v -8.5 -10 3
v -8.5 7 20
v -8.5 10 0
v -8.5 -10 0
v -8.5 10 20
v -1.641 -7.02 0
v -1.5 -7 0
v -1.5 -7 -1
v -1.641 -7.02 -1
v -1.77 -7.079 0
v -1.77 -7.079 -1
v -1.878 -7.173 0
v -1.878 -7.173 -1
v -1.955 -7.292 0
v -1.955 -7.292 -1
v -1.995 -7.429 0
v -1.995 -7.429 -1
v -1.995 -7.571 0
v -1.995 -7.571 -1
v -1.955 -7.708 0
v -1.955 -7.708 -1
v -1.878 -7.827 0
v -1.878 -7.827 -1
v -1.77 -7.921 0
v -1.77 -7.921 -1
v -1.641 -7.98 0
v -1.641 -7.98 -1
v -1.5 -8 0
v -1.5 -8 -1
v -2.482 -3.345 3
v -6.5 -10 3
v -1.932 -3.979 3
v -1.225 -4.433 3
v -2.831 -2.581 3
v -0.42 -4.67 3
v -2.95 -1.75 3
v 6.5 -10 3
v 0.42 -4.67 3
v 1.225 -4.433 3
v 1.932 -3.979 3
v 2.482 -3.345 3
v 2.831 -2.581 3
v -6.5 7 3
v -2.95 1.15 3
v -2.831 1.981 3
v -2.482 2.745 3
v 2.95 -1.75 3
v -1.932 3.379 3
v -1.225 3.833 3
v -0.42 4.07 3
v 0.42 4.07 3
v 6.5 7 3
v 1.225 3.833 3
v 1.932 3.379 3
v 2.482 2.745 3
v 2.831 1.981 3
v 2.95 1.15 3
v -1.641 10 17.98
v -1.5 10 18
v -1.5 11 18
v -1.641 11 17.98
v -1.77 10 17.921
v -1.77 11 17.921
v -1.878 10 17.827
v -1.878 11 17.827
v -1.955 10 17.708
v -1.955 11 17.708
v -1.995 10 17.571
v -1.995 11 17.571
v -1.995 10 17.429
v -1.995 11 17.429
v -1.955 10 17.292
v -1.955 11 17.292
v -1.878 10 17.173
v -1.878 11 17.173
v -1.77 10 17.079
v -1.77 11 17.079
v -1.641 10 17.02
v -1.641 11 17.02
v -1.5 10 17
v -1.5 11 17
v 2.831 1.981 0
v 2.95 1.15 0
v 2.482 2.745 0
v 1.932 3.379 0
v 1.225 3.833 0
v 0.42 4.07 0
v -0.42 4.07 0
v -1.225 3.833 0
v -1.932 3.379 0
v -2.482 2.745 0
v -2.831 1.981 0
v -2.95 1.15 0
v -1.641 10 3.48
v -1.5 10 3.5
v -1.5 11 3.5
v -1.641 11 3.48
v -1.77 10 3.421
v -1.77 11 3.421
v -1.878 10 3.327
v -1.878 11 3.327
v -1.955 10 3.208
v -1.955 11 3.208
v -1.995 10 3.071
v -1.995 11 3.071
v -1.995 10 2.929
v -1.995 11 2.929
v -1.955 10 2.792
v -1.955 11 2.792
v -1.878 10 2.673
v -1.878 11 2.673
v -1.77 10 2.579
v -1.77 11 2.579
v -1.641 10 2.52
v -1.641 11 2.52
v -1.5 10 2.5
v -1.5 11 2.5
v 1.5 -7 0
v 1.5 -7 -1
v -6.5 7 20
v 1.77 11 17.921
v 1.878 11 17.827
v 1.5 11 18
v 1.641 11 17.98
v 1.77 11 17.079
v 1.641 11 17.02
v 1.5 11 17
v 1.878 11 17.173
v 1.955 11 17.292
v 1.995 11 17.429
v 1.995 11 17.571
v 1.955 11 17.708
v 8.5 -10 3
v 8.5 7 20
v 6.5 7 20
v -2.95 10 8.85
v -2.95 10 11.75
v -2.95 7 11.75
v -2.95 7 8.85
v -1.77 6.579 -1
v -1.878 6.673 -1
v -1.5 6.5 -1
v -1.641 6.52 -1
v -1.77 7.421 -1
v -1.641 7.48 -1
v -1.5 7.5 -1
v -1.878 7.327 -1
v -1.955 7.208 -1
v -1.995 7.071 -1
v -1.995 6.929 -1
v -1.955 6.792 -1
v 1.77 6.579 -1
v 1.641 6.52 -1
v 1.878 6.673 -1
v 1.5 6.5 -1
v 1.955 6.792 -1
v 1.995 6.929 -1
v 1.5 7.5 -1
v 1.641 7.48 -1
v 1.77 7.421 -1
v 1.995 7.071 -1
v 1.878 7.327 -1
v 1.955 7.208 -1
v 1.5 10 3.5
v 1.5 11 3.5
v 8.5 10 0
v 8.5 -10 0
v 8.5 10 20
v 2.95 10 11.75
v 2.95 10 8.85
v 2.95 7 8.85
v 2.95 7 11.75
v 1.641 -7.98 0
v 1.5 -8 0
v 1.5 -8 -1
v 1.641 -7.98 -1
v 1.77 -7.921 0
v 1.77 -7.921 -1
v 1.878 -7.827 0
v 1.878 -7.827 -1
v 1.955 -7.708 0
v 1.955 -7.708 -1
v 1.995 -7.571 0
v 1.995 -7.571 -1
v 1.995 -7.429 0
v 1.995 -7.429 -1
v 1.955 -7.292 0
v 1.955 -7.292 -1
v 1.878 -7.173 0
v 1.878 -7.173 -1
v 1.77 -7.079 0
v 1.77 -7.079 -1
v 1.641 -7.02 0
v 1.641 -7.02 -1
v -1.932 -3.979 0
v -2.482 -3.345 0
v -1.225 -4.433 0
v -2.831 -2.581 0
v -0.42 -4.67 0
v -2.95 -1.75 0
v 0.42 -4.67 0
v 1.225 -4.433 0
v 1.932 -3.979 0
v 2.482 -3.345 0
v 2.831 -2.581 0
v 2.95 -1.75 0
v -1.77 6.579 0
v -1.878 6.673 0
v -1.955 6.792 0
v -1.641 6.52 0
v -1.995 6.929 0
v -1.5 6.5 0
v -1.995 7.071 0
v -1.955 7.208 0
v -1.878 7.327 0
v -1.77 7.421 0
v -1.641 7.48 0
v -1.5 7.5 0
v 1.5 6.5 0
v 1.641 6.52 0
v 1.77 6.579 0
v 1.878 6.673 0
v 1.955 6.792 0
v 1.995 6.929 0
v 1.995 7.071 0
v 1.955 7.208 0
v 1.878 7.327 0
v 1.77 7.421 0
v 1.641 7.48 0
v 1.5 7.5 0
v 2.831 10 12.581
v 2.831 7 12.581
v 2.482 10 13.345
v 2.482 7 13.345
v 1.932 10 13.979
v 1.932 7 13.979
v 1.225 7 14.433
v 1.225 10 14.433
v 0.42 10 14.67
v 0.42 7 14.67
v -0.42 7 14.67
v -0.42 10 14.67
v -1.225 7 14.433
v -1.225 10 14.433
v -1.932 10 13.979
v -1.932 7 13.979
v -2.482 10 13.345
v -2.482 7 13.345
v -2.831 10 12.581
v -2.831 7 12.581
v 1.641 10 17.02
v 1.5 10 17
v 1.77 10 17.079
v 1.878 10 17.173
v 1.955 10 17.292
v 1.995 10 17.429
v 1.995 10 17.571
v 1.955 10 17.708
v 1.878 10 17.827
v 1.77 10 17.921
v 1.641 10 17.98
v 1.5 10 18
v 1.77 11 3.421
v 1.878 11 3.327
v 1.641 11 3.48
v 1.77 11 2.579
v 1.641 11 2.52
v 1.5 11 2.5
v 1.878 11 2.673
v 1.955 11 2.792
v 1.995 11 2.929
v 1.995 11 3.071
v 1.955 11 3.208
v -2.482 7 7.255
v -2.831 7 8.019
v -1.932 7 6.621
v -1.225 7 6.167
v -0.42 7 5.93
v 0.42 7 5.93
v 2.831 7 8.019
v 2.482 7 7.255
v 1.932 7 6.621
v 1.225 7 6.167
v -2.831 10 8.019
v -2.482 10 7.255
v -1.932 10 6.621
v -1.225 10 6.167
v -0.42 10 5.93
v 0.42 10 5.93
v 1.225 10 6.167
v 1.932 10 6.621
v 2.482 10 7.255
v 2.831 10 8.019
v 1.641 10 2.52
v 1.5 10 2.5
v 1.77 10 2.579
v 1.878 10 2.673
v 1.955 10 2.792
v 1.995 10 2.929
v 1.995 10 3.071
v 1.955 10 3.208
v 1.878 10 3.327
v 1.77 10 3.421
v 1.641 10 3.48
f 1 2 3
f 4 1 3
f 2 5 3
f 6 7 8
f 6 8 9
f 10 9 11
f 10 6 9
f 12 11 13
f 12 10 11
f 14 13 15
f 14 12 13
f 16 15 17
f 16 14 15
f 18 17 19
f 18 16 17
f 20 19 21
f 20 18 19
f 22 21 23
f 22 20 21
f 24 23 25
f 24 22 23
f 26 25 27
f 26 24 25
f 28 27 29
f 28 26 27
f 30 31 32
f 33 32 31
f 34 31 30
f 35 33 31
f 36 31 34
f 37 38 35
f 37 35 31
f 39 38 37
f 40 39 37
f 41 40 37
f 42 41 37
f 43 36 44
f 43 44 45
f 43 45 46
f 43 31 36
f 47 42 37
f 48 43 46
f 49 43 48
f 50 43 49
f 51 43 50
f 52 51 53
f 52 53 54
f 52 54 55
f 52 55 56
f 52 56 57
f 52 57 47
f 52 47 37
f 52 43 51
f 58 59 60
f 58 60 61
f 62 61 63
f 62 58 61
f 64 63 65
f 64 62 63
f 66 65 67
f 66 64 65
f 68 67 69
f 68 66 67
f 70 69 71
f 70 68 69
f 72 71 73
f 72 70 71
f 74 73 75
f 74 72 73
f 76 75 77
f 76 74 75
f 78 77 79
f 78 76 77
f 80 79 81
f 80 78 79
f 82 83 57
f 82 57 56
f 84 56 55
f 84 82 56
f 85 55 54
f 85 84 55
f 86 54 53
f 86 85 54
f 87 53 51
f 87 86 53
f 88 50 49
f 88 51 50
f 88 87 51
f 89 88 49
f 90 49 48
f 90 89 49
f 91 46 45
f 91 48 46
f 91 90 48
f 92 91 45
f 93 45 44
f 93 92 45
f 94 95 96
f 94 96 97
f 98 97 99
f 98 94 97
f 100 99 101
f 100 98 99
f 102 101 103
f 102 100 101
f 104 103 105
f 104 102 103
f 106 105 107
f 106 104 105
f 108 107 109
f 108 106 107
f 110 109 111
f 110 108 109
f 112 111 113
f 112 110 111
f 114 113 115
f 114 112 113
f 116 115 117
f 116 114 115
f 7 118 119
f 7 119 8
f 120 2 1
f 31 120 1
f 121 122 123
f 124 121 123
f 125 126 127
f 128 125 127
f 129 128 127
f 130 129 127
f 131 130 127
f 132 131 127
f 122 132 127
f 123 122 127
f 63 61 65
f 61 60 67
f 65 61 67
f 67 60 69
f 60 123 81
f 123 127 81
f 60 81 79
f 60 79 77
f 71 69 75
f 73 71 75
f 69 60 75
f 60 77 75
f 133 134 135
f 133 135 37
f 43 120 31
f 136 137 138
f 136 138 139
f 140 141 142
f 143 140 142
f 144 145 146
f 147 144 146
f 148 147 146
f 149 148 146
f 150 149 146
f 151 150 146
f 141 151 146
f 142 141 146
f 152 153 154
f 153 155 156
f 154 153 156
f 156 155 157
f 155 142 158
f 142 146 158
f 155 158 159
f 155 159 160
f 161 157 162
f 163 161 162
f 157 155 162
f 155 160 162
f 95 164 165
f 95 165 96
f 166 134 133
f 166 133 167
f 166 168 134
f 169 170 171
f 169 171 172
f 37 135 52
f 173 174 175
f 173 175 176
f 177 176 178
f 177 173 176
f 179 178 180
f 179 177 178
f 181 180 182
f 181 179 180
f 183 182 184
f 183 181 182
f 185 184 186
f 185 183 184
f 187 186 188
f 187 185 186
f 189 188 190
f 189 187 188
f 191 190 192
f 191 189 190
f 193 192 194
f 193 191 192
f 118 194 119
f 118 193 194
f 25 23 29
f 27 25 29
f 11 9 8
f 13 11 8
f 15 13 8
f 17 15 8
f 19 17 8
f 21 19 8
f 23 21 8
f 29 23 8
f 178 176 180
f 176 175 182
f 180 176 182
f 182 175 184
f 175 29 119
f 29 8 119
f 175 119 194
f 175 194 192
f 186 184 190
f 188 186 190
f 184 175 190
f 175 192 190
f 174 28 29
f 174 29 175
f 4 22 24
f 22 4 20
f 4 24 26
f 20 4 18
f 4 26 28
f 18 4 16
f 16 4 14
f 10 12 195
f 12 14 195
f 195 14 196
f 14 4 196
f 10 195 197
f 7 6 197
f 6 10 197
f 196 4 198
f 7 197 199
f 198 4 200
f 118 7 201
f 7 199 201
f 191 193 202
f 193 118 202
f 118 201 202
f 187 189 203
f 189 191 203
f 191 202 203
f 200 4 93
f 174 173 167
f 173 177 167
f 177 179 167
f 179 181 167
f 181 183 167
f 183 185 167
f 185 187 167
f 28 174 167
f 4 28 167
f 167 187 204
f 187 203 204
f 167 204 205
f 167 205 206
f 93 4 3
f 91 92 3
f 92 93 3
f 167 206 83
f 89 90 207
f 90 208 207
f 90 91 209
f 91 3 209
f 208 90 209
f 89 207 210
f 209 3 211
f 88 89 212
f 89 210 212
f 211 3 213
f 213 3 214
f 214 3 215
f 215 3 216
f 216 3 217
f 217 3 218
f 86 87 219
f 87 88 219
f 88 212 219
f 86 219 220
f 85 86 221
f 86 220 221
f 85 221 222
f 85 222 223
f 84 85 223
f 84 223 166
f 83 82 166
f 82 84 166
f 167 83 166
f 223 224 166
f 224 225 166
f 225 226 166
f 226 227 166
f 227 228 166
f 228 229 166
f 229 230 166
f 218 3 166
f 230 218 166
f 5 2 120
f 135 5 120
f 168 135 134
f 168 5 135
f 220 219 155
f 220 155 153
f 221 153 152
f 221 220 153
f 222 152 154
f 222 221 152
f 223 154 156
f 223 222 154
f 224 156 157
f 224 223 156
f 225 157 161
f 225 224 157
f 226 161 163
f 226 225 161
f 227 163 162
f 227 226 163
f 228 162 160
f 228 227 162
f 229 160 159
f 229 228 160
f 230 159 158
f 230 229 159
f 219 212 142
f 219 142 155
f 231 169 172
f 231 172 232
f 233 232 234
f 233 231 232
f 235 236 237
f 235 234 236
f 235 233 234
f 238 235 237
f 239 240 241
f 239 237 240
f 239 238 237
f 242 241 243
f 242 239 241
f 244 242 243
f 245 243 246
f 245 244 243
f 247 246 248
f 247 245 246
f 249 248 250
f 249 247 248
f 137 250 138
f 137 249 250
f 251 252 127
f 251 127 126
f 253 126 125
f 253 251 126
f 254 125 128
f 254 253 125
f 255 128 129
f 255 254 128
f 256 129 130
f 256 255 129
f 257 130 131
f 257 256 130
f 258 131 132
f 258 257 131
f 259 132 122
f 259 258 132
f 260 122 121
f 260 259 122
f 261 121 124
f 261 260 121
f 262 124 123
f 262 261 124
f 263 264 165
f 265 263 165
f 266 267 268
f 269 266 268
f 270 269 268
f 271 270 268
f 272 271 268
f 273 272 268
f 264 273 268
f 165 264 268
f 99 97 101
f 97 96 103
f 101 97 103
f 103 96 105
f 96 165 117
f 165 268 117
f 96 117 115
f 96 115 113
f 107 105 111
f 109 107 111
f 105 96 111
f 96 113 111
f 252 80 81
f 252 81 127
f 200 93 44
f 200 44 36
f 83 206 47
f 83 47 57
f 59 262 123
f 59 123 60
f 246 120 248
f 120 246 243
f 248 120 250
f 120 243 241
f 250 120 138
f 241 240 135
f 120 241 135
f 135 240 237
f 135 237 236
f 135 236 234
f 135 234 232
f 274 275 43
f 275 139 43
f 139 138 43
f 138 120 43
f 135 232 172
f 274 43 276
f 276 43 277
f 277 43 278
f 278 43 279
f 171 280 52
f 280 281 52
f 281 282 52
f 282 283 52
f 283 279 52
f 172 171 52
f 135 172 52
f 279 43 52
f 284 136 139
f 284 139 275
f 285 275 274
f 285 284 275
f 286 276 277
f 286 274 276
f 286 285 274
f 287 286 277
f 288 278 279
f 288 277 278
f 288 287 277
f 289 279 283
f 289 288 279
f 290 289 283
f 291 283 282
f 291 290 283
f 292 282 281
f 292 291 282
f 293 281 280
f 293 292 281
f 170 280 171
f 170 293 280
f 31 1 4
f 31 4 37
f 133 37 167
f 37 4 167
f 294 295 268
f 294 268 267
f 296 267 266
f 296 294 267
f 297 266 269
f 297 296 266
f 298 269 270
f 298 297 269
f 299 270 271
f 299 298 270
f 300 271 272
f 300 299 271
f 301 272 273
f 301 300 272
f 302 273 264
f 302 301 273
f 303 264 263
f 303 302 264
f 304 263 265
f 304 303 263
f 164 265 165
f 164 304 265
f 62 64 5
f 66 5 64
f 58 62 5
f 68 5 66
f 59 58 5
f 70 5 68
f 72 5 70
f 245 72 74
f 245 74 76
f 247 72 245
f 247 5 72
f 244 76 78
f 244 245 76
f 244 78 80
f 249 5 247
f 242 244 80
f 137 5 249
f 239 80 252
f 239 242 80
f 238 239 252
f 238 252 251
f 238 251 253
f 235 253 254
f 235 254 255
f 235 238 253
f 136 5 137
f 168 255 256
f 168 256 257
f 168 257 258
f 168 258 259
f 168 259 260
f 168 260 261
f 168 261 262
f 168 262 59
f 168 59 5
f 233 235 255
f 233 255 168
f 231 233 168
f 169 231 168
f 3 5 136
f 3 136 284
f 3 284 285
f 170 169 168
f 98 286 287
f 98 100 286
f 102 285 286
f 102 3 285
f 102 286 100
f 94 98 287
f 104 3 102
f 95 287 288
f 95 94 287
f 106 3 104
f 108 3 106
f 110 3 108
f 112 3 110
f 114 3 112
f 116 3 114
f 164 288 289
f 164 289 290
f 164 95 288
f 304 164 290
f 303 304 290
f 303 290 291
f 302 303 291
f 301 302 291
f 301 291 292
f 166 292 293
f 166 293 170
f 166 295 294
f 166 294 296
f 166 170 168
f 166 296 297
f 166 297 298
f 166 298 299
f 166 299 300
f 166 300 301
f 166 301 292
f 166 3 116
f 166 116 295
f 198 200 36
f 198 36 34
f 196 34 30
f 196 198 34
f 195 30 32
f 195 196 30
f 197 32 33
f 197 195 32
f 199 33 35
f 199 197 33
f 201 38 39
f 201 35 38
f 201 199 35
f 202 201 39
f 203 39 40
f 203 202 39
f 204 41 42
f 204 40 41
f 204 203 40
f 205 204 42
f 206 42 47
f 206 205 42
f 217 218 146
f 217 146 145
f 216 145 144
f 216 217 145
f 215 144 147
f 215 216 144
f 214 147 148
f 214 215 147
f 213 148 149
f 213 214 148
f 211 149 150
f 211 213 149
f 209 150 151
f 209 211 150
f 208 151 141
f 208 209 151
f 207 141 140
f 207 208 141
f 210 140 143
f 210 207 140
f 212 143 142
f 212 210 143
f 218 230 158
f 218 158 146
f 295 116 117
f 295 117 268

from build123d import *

# Parameters (mm, degrees)
SKETCH_1_W          = 17
SKETCH_1_H          = 20
EXTRUDE_1_DEPTH     = 3
SKETCH_2_W          = 17
SKETCH_2_H          = 3
EXTRUDE_2_DEPTH     = 17
EXTRUDE_3_DEPTH     = 2
EXTRUDE_4_DEPTH     = 2
EXTRUDE_5_DEPTH     = 1
EXTRUDE_6_DEPTH     = 1
CUT_EXTRUDE_3_DEPTH = 21
CUT_EXTRUDE_4_DEPTH = 21


with BuildPart() as part:
    # 草图1 → 凸台-拉伸1 (new body)
    with BuildSketch(Plane.XY):
        Rectangle(SKETCH_1_W, SKETCH_1_H)
    extrude(amount=EXTRUDE_1_DEPTH)

    # 草图2 → 凸台-拉伸2 (add)
    with BuildSketch(Plane.XY.offset(3)):
        with Locations((0, 8.5)):
            Rectangle(SKETCH_2_W, SKETCH_2_H)
    extrude(amount=EXTRUDE_2_DEPTH)

    # 草图3 → 凸台-拉伸3 (add)
    with BuildSketch(Plane.ZY.offset(8.5)):
        Polygon((20, 7), (3, -10), (3, 7), align=None)
    extrude(amount=-EXTRUDE_3_DEPTH)

    # 草图4 → 凸台-拉伸4 (add)
    with BuildSketch(Plane(origin=(8.5, 0, 0), x_dir=(0, 0, -1), z_dir=(1, 0, 0))):
        Polygon((-20, 7), (-3, -10), (-3, 7), align=None)
    extrude(amount=-EXTRUDE_4_DEPTH)

    # 草图5 → 凸台-拉伸5 (add)
    with BuildSketch(Plane(origin=(0, 10, 0), x_dir=(1, 0, 0), z_dir=(0, 1, 0))):
        with BuildLine():
            Line((-1.5, -2.5), (1.5, -2.5))
            ThreePointArc((1.5, -2.5), (2, -3), (1.5, -3.5))
            Line((1.5, -3.5), (-1.5, -3.5))
            ThreePointArc((-1.5, -3.5), (-2, -3), (-1.5, -2.5))
        make_face()
        with BuildLine():
            Line((-1.5, -17), (1.5, -17))
            ThreePointArc((1.5, -17), (2, -17.5), (1.5, -18))
            Line((1.5, -18), (-1.5, -18))
            ThreePointArc((-1.5, -18), (-2, -17.5), (-1.5, -17))
        make_face()
    extrude(amount=EXTRUDE_5_DEPTH)

    # 草图6 → 凸台-拉伸6 (add)
    with BuildSketch(Plane(origin=(0, 0, 0), x_dir=(-1, 0, 0), z_dir=(0, 0, -1))):
        with BuildLine():
            Line((-1.5, 7.5), (1.5, 7.5))
            ThreePointArc((1.5, 7.5), (2, 7), (1.5, 6.5))
            Line((1.5, 6.5), (-1.5, 6.5))
            ThreePointArc((-1.5, 6.5), (-2, 7), (-1.5, 7.5))
        make_face()
        with BuildLine():
            Line((-1.5, -7), (1.5, -7))
            ThreePointArc((1.5, -7), (2, -7.5), (1.5, -8))
            Line((1.5, -8), (-1.5, -8))
            ThreePointArc((-1.5, -8), (-2, -7.5), (-1.5, -7))
        make_face()
    extrude(amount=EXTRUDE_6_DEPTH)

    # 草图7 → 切除-拉伸3 (cut, through all)
    with BuildSketch(Plane(origin=(0, 0, 0), x_dir=(-1, 0, 0), z_dir=(0, 0, -1))):
        with BuildLine():
            Line((2.95, 1.15), (2.95, -1.75))
            ThreePointArc((2.95, -1.75), (0, -4.7), (-2.95, -1.75))
            Line((-2.95, -1.75), (-2.95, 1.15))
            ThreePointArc((-2.95, 1.15), (0, 4.1), (2.95, 1.15))
        make_face()
    extrude(amount=-CUT_EXTRUDE_3_DEPTH, mode=Mode.SUBTRACT)

    # 草图8 → 切除-拉伸4 (cut, through all)
    with BuildSketch(Plane(origin=(0, 10, 0), x_dir=(1, 0, 0), z_dir=(0, 1, 0))):
        with BuildLine():
            Line((2.95, -8.85), (2.95, -11.75))
            ThreePointArc((2.95, -11.75), (0, -14.7), (-2.95, -11.75))
            Line((-2.95, -11.75), (-2.95, -8.85))
            ThreePointArc((-2.95, -8.85), (0, -5.9), (2.95, -8.85))
        make_face()
    extrude(amount=-CUT_EXTRUDE_4_DEPTH, mode=Mode.SUBTRACT)


solid = part.part
